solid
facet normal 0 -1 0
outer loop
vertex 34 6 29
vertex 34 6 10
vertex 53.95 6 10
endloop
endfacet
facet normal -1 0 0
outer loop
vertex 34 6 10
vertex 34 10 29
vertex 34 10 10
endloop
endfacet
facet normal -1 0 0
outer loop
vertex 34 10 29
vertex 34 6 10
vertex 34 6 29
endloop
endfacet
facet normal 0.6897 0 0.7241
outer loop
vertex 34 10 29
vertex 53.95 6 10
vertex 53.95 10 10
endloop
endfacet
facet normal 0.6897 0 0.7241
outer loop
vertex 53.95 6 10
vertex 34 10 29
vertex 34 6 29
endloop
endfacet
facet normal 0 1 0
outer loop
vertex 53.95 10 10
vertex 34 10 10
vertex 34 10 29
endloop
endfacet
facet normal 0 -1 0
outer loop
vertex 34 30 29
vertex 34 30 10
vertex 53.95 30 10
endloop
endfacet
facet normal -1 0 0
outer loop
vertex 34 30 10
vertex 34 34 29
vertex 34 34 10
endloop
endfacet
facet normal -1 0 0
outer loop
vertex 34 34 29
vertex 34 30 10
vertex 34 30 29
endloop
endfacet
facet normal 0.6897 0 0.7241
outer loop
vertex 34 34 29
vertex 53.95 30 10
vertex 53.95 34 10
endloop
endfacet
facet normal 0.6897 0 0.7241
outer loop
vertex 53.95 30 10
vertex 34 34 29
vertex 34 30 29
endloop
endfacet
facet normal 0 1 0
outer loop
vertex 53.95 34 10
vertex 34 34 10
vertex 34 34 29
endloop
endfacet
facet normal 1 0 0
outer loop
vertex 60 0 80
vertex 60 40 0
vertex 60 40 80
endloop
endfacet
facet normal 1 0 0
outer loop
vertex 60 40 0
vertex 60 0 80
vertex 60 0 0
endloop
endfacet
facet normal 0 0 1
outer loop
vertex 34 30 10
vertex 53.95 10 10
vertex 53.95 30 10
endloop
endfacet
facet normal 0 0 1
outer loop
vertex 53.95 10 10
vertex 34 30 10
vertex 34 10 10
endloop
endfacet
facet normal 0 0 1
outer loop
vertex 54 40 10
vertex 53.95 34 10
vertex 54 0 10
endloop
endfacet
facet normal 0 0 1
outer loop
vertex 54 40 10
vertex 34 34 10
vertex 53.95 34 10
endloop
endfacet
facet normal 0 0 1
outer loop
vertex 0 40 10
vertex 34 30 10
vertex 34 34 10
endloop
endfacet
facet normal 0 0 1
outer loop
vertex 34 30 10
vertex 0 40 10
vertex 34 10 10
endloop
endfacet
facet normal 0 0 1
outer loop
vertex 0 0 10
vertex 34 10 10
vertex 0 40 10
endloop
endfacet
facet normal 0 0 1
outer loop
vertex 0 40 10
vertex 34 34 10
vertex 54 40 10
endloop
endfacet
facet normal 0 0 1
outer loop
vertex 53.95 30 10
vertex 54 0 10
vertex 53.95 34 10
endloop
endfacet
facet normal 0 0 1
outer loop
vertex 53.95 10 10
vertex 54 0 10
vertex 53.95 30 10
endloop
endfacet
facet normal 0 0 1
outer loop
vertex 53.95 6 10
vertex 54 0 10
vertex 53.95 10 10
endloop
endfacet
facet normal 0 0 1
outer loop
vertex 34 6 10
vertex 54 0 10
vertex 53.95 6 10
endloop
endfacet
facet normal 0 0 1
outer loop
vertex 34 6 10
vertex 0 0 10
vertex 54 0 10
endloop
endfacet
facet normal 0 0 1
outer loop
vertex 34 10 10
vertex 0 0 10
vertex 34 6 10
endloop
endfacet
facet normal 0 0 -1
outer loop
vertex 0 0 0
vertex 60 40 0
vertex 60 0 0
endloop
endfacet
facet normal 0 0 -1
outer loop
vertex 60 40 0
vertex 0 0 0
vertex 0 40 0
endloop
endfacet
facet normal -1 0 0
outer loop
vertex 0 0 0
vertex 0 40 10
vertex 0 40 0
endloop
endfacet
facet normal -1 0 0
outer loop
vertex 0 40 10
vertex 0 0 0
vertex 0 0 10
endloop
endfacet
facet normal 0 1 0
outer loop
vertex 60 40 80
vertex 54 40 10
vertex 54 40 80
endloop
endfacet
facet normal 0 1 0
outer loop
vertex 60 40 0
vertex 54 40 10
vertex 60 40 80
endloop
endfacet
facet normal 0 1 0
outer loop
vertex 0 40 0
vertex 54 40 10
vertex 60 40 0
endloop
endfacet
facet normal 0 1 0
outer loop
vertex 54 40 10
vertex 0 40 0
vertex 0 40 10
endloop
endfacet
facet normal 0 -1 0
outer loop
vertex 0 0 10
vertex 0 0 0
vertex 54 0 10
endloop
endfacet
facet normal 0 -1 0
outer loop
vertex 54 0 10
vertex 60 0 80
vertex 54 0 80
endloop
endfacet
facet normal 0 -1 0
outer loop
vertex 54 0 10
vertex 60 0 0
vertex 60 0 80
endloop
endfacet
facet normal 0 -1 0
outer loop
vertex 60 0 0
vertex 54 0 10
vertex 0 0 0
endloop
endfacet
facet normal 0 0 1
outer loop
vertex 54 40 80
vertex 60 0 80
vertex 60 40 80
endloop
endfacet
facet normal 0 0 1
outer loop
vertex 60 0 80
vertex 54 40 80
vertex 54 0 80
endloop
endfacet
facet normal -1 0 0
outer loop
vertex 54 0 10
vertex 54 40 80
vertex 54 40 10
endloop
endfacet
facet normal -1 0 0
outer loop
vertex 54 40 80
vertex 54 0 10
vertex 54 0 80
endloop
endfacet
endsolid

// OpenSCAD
$fn = 32;

// ----------------------------------------------------------------------
// Rib bracket: 2-gusset L bracket
// ----------------------------------------------------------------------

// --- parameters (mm) ---
base_l = 60;              // foot length, X
base_w = 40;              // foot width, Y
base_t = 10;              // foot thickness
plate_t = 6;              // upright plate thickness
plate_h = 80;             // overall height
gus_l = 20;               // gusset leg along the foot
gus_h = 20;               // gusset height
gus_t = 4;                // gusset thickness
gus_edge = 6;             // gusset margin from the foot edge
n_gus = 2;                // gusset count

gus_pitch = (base_w - 2 * gus_edge - gus_t) / (n_gus - 1);  // gusset pitch

union() {
  cube([base_l, base_w, base_t]);
  translate([base_l - plate_t, 0, base_t - 1])
    cube([plate_t, base_w, plate_h - base_t + 1]);
  for (i = [0 : n_gus - 1])
    translate([base_l - plate_t - gus_l, gus_edge + i * gus_pitch, base_t - 1])
      rotate([-90, 0, 0])
        linear_extrude(height = gus_t)
          polygon(points = [[0, 0], [gus_l + 1, 0], [0, -gus_h]]);
}
